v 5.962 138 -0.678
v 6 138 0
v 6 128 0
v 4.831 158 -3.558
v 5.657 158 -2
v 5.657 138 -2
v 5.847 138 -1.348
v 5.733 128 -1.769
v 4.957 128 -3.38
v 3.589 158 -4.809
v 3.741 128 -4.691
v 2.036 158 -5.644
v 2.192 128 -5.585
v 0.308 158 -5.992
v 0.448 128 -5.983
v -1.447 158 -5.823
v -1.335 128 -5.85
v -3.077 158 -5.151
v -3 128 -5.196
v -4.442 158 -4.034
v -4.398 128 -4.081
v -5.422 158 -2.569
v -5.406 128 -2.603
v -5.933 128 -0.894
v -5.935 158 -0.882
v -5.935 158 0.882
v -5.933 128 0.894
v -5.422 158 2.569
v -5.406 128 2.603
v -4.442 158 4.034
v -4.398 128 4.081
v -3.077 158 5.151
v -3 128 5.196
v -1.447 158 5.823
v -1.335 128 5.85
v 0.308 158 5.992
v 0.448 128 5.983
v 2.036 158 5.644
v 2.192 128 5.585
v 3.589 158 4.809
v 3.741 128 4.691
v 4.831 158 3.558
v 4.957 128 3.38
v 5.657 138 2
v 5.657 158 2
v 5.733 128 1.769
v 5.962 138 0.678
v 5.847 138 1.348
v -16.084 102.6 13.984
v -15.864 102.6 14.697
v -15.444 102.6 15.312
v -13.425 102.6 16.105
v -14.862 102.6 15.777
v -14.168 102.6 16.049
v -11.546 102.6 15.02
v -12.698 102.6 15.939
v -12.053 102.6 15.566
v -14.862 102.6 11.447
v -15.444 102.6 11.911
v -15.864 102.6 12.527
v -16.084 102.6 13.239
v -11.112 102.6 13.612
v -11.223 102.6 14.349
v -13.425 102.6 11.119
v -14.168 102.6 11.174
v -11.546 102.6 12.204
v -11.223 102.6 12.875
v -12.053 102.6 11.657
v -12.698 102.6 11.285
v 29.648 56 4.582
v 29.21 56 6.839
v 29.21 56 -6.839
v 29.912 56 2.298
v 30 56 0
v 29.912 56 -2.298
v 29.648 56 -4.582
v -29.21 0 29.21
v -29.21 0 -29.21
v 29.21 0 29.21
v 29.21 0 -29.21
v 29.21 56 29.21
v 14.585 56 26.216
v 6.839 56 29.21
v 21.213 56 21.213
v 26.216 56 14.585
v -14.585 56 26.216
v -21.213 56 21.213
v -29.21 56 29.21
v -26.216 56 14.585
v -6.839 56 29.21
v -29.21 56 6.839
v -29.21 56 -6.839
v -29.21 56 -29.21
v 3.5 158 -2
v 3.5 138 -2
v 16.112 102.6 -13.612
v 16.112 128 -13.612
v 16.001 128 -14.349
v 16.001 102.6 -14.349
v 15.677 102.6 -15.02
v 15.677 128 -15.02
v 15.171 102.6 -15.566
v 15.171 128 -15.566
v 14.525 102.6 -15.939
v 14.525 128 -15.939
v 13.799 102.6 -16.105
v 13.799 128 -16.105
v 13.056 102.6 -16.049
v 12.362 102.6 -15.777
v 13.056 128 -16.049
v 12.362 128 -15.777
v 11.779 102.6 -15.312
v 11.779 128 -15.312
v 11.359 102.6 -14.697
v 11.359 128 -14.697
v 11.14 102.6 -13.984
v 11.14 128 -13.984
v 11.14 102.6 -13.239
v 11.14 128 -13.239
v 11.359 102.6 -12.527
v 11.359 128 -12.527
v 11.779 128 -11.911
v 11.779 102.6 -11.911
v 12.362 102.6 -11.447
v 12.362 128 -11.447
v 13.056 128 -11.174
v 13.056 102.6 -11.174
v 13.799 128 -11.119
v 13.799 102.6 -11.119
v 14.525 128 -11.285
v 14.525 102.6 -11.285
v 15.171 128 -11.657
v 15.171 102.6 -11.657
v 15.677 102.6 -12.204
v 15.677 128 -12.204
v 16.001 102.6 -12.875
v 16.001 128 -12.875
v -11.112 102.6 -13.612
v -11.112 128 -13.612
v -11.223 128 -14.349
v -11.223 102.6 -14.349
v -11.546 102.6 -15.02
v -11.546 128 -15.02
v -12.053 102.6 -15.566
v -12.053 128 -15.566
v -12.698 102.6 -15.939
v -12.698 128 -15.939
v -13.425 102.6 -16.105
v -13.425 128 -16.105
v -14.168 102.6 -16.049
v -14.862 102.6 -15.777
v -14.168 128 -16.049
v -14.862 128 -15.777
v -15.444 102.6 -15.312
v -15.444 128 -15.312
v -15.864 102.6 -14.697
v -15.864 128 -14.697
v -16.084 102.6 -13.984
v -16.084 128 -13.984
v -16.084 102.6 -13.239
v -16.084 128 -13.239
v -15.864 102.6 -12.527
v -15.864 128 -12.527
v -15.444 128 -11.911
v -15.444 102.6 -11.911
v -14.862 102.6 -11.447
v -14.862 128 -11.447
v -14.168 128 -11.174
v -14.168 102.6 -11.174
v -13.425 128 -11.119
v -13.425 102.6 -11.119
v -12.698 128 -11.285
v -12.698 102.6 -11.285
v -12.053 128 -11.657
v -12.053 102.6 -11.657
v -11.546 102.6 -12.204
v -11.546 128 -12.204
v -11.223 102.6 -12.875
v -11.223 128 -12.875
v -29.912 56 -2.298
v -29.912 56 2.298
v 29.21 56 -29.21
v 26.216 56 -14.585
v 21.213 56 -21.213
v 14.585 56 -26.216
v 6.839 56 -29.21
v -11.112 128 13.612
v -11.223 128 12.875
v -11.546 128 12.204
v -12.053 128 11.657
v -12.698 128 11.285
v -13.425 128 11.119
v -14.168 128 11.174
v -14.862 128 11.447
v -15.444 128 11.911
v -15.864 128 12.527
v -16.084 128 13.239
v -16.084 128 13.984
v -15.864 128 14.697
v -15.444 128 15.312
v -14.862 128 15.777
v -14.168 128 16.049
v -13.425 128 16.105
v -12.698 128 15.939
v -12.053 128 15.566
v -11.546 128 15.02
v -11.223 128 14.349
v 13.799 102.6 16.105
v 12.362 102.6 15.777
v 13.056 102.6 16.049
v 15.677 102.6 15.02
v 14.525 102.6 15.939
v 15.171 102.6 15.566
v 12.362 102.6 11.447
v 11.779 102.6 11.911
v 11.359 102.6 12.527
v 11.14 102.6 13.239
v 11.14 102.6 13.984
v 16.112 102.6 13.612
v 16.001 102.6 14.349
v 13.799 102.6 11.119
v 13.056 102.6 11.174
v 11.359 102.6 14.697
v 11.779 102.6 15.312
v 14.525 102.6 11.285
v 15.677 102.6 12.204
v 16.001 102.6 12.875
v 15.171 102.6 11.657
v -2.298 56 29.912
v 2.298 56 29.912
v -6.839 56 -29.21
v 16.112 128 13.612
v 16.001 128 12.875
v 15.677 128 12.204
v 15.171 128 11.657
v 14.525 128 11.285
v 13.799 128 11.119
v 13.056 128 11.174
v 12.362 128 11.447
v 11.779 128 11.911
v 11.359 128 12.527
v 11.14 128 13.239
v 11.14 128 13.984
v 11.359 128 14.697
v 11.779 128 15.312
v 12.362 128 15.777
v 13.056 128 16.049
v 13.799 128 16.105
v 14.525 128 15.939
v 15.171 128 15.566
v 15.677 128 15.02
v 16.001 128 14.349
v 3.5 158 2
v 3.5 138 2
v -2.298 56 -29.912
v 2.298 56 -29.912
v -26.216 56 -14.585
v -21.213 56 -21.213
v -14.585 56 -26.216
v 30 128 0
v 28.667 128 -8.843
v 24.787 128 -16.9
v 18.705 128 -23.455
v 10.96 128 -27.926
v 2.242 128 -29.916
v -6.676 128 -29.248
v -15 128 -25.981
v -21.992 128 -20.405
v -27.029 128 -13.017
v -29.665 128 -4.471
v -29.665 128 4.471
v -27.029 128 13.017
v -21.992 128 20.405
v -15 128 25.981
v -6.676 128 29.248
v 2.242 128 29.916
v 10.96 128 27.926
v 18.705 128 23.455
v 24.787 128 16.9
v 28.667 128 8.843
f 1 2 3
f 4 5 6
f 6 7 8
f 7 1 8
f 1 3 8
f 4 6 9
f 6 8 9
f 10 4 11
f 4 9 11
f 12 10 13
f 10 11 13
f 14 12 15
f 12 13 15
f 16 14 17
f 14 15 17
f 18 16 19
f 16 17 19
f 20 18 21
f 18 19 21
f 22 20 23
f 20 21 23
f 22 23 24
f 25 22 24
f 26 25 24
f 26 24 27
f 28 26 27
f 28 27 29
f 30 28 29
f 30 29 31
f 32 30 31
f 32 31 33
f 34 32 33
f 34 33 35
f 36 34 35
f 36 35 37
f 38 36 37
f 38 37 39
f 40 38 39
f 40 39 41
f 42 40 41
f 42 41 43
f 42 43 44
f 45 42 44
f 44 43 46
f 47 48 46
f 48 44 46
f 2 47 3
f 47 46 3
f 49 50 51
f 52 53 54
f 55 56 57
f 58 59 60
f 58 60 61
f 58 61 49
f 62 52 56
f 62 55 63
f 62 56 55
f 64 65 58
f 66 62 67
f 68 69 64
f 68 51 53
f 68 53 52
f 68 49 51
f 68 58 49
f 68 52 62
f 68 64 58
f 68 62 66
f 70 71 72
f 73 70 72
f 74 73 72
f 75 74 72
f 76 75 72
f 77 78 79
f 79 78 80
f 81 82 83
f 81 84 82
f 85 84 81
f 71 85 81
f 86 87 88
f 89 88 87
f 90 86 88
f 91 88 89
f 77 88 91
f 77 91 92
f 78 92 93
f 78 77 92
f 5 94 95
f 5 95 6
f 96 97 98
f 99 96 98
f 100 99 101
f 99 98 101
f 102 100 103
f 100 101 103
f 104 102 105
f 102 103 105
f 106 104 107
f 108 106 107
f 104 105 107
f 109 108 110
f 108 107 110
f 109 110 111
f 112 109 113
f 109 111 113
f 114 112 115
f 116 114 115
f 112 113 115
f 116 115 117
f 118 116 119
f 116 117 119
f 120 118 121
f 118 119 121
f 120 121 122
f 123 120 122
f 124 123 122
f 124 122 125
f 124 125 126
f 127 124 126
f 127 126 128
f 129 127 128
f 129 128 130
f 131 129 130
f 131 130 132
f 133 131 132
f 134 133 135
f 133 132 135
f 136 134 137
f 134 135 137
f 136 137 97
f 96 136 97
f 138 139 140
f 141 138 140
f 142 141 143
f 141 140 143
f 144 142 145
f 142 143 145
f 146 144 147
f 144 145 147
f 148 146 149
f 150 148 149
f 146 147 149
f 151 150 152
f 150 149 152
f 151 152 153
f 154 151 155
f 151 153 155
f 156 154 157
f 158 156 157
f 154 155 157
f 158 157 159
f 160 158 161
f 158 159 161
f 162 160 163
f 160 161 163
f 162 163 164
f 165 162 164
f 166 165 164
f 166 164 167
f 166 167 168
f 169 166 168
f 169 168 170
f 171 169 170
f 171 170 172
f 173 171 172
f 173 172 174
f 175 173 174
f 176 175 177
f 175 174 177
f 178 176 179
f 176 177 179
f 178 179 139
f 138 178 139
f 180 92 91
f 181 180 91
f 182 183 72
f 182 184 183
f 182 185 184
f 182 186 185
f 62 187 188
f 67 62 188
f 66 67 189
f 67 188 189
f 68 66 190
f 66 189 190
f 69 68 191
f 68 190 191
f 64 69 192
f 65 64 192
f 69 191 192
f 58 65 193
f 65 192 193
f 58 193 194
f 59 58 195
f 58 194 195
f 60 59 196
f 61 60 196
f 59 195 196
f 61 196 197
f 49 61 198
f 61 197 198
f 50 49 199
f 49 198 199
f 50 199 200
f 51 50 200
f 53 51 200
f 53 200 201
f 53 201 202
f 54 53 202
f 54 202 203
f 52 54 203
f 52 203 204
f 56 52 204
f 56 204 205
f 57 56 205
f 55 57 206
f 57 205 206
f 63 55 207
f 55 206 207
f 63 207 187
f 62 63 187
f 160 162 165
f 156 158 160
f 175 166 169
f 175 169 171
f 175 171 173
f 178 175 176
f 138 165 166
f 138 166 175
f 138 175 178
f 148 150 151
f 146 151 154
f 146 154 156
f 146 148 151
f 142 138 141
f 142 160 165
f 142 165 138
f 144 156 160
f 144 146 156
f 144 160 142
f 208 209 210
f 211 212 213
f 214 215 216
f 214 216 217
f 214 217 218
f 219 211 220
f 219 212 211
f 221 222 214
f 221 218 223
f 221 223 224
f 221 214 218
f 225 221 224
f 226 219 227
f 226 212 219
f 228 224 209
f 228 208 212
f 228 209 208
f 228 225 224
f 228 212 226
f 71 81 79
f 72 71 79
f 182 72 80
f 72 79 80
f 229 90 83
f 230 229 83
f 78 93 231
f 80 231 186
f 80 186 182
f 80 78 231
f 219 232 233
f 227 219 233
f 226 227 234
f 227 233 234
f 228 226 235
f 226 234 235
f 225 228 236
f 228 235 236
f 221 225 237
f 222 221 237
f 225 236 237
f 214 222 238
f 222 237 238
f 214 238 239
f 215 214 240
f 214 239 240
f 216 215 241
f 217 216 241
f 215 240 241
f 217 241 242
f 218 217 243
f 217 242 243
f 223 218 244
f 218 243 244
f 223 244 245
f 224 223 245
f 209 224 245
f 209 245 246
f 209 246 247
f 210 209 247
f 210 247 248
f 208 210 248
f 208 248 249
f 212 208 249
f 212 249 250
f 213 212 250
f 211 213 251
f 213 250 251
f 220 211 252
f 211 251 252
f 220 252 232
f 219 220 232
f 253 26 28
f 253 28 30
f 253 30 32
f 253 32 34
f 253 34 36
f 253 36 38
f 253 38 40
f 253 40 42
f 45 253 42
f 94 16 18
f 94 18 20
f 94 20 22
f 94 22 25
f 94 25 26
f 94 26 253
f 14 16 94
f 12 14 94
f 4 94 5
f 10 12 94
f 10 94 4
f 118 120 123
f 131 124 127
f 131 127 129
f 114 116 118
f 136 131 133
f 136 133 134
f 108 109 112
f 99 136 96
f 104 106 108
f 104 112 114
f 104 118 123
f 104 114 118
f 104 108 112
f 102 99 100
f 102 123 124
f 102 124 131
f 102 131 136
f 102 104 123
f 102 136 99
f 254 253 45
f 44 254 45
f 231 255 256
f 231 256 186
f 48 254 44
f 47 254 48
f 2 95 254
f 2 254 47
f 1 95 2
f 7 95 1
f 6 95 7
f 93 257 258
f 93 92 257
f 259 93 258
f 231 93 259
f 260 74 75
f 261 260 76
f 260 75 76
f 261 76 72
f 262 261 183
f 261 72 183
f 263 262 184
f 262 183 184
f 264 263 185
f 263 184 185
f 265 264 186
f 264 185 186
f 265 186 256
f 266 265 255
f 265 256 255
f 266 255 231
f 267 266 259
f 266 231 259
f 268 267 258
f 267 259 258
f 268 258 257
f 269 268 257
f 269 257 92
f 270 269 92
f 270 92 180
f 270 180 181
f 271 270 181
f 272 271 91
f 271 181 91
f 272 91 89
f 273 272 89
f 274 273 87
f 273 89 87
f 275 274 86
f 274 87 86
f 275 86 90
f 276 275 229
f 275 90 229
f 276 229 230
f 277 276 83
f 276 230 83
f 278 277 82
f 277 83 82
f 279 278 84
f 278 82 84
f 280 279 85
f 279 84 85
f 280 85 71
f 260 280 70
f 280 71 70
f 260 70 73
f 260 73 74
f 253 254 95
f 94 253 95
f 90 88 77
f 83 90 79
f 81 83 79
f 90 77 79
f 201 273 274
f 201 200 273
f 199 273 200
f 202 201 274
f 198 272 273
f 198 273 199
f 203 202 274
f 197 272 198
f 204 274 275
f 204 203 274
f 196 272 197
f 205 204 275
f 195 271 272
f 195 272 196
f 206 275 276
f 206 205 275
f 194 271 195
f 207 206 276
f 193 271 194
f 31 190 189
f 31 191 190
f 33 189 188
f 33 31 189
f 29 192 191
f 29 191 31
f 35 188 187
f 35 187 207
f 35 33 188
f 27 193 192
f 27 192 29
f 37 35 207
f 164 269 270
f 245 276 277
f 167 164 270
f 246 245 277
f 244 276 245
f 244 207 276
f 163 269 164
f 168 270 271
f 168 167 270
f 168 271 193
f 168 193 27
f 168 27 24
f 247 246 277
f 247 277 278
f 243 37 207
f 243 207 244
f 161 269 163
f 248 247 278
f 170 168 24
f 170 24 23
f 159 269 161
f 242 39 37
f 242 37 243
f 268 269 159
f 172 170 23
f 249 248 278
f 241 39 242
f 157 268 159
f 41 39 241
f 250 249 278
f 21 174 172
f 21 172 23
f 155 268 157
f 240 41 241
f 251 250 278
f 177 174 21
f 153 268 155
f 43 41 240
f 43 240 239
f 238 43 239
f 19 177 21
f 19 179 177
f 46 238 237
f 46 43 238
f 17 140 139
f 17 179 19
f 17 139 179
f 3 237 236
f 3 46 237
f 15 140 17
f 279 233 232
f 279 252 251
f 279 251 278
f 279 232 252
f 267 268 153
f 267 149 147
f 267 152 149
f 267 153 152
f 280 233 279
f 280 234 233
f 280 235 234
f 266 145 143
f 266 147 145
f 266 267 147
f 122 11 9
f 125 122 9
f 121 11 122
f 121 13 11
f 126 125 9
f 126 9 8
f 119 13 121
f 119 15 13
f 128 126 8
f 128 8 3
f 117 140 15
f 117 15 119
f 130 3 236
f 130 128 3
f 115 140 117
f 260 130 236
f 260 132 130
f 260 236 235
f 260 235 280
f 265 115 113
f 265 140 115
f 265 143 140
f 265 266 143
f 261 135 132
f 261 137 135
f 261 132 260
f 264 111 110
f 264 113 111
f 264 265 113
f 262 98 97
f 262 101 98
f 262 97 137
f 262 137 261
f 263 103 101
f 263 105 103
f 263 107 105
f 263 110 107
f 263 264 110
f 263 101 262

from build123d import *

# Parameters (mm, degrees)
SKETCH1_W           = 58.42
SKETCH1_H           = 58.42
BOSS_EXTRUDE1_DEPTH = 56
SKETCH2_R           = 30
BOSS_EXTRUDE2_DEPTH = 72
SKETCH3_R           = 6
BOSS_EXTRUDE3_DEPTH = 30
SKETCH4_R           = 2.5
CUT_EXTRUDE1_DEPTH  = 25.4
SKETCH5_W           = 2.5
SKETCH5_H           = 4
CUT_EXTRUDE2_DEPTH  = 20


with BuildPart() as part:
    # Sketch1 → Boss-Extrude1 (new body)
    with BuildSketch(Plane(origin=(0, 0, 0), x_dir=(1, 0, 0), z_dir=(0, 1, 0))):
        Rectangle(SKETCH1_W, SKETCH1_H)
    extrude(amount=BOSS_EXTRUDE1_DEPTH)

    # Sketch2 → Boss-Extrude2 (add)
    with BuildSketch(Plane(origin=(0, 56, 0), x_dir=(1, 0, 0), z_dir=(0, 1, 0))):
        Circle(SKETCH2_R)
    extrude(amount=BOSS_EXTRUDE2_DEPTH)

    # Sketch3 → Boss-Extrude3 (add)
    with BuildSketch(Plane(origin=(0, 128, 0), x_dir=(1, 0, 0), z_dir=(0, 1, 0))):
        Circle(SKETCH3_R)
    extrude(amount=BOSS_EXTRUDE3_DEPTH)

    # Sketch4 → Cut-Extrude1 (cut)
    with BuildSketch(Plane(origin=(0, 128, 0), x_dir=(1, 0, 0), z_dir=(0, 1, 0))):
        with Locations((-13.611805538, 13.611805538)):
            Circle(SKETCH4_R)
        with Locations((13.611805538, 13.611805538)):
            Circle(SKETCH4_R)
        with Locations((13.611805538, -13.611805538)):
            Circle(SKETCH4_R)
        with Locations((-13.611805538, -13.611805538)):
            Circle(SKETCH4_R)
    extrude(amount=-CUT_EXTRUDE1_DEPTH, mode=Mode.SUBTRACT)

    # Sketch5 → Cut-Extrude2 (cut)
    with BuildSketch(Plane(origin=(0, 158, 0), x_dir=(1, 0, 0), z_dir=(0, 1, 0))):
        with Locations((4.75, 0)):
            Rectangle(SKETCH5_W, SKETCH5_H)
    extrude(amount=-CUT_EXTRUDE2_DEPTH, mode=Mode.SUBTRACT)


solid = part.part
